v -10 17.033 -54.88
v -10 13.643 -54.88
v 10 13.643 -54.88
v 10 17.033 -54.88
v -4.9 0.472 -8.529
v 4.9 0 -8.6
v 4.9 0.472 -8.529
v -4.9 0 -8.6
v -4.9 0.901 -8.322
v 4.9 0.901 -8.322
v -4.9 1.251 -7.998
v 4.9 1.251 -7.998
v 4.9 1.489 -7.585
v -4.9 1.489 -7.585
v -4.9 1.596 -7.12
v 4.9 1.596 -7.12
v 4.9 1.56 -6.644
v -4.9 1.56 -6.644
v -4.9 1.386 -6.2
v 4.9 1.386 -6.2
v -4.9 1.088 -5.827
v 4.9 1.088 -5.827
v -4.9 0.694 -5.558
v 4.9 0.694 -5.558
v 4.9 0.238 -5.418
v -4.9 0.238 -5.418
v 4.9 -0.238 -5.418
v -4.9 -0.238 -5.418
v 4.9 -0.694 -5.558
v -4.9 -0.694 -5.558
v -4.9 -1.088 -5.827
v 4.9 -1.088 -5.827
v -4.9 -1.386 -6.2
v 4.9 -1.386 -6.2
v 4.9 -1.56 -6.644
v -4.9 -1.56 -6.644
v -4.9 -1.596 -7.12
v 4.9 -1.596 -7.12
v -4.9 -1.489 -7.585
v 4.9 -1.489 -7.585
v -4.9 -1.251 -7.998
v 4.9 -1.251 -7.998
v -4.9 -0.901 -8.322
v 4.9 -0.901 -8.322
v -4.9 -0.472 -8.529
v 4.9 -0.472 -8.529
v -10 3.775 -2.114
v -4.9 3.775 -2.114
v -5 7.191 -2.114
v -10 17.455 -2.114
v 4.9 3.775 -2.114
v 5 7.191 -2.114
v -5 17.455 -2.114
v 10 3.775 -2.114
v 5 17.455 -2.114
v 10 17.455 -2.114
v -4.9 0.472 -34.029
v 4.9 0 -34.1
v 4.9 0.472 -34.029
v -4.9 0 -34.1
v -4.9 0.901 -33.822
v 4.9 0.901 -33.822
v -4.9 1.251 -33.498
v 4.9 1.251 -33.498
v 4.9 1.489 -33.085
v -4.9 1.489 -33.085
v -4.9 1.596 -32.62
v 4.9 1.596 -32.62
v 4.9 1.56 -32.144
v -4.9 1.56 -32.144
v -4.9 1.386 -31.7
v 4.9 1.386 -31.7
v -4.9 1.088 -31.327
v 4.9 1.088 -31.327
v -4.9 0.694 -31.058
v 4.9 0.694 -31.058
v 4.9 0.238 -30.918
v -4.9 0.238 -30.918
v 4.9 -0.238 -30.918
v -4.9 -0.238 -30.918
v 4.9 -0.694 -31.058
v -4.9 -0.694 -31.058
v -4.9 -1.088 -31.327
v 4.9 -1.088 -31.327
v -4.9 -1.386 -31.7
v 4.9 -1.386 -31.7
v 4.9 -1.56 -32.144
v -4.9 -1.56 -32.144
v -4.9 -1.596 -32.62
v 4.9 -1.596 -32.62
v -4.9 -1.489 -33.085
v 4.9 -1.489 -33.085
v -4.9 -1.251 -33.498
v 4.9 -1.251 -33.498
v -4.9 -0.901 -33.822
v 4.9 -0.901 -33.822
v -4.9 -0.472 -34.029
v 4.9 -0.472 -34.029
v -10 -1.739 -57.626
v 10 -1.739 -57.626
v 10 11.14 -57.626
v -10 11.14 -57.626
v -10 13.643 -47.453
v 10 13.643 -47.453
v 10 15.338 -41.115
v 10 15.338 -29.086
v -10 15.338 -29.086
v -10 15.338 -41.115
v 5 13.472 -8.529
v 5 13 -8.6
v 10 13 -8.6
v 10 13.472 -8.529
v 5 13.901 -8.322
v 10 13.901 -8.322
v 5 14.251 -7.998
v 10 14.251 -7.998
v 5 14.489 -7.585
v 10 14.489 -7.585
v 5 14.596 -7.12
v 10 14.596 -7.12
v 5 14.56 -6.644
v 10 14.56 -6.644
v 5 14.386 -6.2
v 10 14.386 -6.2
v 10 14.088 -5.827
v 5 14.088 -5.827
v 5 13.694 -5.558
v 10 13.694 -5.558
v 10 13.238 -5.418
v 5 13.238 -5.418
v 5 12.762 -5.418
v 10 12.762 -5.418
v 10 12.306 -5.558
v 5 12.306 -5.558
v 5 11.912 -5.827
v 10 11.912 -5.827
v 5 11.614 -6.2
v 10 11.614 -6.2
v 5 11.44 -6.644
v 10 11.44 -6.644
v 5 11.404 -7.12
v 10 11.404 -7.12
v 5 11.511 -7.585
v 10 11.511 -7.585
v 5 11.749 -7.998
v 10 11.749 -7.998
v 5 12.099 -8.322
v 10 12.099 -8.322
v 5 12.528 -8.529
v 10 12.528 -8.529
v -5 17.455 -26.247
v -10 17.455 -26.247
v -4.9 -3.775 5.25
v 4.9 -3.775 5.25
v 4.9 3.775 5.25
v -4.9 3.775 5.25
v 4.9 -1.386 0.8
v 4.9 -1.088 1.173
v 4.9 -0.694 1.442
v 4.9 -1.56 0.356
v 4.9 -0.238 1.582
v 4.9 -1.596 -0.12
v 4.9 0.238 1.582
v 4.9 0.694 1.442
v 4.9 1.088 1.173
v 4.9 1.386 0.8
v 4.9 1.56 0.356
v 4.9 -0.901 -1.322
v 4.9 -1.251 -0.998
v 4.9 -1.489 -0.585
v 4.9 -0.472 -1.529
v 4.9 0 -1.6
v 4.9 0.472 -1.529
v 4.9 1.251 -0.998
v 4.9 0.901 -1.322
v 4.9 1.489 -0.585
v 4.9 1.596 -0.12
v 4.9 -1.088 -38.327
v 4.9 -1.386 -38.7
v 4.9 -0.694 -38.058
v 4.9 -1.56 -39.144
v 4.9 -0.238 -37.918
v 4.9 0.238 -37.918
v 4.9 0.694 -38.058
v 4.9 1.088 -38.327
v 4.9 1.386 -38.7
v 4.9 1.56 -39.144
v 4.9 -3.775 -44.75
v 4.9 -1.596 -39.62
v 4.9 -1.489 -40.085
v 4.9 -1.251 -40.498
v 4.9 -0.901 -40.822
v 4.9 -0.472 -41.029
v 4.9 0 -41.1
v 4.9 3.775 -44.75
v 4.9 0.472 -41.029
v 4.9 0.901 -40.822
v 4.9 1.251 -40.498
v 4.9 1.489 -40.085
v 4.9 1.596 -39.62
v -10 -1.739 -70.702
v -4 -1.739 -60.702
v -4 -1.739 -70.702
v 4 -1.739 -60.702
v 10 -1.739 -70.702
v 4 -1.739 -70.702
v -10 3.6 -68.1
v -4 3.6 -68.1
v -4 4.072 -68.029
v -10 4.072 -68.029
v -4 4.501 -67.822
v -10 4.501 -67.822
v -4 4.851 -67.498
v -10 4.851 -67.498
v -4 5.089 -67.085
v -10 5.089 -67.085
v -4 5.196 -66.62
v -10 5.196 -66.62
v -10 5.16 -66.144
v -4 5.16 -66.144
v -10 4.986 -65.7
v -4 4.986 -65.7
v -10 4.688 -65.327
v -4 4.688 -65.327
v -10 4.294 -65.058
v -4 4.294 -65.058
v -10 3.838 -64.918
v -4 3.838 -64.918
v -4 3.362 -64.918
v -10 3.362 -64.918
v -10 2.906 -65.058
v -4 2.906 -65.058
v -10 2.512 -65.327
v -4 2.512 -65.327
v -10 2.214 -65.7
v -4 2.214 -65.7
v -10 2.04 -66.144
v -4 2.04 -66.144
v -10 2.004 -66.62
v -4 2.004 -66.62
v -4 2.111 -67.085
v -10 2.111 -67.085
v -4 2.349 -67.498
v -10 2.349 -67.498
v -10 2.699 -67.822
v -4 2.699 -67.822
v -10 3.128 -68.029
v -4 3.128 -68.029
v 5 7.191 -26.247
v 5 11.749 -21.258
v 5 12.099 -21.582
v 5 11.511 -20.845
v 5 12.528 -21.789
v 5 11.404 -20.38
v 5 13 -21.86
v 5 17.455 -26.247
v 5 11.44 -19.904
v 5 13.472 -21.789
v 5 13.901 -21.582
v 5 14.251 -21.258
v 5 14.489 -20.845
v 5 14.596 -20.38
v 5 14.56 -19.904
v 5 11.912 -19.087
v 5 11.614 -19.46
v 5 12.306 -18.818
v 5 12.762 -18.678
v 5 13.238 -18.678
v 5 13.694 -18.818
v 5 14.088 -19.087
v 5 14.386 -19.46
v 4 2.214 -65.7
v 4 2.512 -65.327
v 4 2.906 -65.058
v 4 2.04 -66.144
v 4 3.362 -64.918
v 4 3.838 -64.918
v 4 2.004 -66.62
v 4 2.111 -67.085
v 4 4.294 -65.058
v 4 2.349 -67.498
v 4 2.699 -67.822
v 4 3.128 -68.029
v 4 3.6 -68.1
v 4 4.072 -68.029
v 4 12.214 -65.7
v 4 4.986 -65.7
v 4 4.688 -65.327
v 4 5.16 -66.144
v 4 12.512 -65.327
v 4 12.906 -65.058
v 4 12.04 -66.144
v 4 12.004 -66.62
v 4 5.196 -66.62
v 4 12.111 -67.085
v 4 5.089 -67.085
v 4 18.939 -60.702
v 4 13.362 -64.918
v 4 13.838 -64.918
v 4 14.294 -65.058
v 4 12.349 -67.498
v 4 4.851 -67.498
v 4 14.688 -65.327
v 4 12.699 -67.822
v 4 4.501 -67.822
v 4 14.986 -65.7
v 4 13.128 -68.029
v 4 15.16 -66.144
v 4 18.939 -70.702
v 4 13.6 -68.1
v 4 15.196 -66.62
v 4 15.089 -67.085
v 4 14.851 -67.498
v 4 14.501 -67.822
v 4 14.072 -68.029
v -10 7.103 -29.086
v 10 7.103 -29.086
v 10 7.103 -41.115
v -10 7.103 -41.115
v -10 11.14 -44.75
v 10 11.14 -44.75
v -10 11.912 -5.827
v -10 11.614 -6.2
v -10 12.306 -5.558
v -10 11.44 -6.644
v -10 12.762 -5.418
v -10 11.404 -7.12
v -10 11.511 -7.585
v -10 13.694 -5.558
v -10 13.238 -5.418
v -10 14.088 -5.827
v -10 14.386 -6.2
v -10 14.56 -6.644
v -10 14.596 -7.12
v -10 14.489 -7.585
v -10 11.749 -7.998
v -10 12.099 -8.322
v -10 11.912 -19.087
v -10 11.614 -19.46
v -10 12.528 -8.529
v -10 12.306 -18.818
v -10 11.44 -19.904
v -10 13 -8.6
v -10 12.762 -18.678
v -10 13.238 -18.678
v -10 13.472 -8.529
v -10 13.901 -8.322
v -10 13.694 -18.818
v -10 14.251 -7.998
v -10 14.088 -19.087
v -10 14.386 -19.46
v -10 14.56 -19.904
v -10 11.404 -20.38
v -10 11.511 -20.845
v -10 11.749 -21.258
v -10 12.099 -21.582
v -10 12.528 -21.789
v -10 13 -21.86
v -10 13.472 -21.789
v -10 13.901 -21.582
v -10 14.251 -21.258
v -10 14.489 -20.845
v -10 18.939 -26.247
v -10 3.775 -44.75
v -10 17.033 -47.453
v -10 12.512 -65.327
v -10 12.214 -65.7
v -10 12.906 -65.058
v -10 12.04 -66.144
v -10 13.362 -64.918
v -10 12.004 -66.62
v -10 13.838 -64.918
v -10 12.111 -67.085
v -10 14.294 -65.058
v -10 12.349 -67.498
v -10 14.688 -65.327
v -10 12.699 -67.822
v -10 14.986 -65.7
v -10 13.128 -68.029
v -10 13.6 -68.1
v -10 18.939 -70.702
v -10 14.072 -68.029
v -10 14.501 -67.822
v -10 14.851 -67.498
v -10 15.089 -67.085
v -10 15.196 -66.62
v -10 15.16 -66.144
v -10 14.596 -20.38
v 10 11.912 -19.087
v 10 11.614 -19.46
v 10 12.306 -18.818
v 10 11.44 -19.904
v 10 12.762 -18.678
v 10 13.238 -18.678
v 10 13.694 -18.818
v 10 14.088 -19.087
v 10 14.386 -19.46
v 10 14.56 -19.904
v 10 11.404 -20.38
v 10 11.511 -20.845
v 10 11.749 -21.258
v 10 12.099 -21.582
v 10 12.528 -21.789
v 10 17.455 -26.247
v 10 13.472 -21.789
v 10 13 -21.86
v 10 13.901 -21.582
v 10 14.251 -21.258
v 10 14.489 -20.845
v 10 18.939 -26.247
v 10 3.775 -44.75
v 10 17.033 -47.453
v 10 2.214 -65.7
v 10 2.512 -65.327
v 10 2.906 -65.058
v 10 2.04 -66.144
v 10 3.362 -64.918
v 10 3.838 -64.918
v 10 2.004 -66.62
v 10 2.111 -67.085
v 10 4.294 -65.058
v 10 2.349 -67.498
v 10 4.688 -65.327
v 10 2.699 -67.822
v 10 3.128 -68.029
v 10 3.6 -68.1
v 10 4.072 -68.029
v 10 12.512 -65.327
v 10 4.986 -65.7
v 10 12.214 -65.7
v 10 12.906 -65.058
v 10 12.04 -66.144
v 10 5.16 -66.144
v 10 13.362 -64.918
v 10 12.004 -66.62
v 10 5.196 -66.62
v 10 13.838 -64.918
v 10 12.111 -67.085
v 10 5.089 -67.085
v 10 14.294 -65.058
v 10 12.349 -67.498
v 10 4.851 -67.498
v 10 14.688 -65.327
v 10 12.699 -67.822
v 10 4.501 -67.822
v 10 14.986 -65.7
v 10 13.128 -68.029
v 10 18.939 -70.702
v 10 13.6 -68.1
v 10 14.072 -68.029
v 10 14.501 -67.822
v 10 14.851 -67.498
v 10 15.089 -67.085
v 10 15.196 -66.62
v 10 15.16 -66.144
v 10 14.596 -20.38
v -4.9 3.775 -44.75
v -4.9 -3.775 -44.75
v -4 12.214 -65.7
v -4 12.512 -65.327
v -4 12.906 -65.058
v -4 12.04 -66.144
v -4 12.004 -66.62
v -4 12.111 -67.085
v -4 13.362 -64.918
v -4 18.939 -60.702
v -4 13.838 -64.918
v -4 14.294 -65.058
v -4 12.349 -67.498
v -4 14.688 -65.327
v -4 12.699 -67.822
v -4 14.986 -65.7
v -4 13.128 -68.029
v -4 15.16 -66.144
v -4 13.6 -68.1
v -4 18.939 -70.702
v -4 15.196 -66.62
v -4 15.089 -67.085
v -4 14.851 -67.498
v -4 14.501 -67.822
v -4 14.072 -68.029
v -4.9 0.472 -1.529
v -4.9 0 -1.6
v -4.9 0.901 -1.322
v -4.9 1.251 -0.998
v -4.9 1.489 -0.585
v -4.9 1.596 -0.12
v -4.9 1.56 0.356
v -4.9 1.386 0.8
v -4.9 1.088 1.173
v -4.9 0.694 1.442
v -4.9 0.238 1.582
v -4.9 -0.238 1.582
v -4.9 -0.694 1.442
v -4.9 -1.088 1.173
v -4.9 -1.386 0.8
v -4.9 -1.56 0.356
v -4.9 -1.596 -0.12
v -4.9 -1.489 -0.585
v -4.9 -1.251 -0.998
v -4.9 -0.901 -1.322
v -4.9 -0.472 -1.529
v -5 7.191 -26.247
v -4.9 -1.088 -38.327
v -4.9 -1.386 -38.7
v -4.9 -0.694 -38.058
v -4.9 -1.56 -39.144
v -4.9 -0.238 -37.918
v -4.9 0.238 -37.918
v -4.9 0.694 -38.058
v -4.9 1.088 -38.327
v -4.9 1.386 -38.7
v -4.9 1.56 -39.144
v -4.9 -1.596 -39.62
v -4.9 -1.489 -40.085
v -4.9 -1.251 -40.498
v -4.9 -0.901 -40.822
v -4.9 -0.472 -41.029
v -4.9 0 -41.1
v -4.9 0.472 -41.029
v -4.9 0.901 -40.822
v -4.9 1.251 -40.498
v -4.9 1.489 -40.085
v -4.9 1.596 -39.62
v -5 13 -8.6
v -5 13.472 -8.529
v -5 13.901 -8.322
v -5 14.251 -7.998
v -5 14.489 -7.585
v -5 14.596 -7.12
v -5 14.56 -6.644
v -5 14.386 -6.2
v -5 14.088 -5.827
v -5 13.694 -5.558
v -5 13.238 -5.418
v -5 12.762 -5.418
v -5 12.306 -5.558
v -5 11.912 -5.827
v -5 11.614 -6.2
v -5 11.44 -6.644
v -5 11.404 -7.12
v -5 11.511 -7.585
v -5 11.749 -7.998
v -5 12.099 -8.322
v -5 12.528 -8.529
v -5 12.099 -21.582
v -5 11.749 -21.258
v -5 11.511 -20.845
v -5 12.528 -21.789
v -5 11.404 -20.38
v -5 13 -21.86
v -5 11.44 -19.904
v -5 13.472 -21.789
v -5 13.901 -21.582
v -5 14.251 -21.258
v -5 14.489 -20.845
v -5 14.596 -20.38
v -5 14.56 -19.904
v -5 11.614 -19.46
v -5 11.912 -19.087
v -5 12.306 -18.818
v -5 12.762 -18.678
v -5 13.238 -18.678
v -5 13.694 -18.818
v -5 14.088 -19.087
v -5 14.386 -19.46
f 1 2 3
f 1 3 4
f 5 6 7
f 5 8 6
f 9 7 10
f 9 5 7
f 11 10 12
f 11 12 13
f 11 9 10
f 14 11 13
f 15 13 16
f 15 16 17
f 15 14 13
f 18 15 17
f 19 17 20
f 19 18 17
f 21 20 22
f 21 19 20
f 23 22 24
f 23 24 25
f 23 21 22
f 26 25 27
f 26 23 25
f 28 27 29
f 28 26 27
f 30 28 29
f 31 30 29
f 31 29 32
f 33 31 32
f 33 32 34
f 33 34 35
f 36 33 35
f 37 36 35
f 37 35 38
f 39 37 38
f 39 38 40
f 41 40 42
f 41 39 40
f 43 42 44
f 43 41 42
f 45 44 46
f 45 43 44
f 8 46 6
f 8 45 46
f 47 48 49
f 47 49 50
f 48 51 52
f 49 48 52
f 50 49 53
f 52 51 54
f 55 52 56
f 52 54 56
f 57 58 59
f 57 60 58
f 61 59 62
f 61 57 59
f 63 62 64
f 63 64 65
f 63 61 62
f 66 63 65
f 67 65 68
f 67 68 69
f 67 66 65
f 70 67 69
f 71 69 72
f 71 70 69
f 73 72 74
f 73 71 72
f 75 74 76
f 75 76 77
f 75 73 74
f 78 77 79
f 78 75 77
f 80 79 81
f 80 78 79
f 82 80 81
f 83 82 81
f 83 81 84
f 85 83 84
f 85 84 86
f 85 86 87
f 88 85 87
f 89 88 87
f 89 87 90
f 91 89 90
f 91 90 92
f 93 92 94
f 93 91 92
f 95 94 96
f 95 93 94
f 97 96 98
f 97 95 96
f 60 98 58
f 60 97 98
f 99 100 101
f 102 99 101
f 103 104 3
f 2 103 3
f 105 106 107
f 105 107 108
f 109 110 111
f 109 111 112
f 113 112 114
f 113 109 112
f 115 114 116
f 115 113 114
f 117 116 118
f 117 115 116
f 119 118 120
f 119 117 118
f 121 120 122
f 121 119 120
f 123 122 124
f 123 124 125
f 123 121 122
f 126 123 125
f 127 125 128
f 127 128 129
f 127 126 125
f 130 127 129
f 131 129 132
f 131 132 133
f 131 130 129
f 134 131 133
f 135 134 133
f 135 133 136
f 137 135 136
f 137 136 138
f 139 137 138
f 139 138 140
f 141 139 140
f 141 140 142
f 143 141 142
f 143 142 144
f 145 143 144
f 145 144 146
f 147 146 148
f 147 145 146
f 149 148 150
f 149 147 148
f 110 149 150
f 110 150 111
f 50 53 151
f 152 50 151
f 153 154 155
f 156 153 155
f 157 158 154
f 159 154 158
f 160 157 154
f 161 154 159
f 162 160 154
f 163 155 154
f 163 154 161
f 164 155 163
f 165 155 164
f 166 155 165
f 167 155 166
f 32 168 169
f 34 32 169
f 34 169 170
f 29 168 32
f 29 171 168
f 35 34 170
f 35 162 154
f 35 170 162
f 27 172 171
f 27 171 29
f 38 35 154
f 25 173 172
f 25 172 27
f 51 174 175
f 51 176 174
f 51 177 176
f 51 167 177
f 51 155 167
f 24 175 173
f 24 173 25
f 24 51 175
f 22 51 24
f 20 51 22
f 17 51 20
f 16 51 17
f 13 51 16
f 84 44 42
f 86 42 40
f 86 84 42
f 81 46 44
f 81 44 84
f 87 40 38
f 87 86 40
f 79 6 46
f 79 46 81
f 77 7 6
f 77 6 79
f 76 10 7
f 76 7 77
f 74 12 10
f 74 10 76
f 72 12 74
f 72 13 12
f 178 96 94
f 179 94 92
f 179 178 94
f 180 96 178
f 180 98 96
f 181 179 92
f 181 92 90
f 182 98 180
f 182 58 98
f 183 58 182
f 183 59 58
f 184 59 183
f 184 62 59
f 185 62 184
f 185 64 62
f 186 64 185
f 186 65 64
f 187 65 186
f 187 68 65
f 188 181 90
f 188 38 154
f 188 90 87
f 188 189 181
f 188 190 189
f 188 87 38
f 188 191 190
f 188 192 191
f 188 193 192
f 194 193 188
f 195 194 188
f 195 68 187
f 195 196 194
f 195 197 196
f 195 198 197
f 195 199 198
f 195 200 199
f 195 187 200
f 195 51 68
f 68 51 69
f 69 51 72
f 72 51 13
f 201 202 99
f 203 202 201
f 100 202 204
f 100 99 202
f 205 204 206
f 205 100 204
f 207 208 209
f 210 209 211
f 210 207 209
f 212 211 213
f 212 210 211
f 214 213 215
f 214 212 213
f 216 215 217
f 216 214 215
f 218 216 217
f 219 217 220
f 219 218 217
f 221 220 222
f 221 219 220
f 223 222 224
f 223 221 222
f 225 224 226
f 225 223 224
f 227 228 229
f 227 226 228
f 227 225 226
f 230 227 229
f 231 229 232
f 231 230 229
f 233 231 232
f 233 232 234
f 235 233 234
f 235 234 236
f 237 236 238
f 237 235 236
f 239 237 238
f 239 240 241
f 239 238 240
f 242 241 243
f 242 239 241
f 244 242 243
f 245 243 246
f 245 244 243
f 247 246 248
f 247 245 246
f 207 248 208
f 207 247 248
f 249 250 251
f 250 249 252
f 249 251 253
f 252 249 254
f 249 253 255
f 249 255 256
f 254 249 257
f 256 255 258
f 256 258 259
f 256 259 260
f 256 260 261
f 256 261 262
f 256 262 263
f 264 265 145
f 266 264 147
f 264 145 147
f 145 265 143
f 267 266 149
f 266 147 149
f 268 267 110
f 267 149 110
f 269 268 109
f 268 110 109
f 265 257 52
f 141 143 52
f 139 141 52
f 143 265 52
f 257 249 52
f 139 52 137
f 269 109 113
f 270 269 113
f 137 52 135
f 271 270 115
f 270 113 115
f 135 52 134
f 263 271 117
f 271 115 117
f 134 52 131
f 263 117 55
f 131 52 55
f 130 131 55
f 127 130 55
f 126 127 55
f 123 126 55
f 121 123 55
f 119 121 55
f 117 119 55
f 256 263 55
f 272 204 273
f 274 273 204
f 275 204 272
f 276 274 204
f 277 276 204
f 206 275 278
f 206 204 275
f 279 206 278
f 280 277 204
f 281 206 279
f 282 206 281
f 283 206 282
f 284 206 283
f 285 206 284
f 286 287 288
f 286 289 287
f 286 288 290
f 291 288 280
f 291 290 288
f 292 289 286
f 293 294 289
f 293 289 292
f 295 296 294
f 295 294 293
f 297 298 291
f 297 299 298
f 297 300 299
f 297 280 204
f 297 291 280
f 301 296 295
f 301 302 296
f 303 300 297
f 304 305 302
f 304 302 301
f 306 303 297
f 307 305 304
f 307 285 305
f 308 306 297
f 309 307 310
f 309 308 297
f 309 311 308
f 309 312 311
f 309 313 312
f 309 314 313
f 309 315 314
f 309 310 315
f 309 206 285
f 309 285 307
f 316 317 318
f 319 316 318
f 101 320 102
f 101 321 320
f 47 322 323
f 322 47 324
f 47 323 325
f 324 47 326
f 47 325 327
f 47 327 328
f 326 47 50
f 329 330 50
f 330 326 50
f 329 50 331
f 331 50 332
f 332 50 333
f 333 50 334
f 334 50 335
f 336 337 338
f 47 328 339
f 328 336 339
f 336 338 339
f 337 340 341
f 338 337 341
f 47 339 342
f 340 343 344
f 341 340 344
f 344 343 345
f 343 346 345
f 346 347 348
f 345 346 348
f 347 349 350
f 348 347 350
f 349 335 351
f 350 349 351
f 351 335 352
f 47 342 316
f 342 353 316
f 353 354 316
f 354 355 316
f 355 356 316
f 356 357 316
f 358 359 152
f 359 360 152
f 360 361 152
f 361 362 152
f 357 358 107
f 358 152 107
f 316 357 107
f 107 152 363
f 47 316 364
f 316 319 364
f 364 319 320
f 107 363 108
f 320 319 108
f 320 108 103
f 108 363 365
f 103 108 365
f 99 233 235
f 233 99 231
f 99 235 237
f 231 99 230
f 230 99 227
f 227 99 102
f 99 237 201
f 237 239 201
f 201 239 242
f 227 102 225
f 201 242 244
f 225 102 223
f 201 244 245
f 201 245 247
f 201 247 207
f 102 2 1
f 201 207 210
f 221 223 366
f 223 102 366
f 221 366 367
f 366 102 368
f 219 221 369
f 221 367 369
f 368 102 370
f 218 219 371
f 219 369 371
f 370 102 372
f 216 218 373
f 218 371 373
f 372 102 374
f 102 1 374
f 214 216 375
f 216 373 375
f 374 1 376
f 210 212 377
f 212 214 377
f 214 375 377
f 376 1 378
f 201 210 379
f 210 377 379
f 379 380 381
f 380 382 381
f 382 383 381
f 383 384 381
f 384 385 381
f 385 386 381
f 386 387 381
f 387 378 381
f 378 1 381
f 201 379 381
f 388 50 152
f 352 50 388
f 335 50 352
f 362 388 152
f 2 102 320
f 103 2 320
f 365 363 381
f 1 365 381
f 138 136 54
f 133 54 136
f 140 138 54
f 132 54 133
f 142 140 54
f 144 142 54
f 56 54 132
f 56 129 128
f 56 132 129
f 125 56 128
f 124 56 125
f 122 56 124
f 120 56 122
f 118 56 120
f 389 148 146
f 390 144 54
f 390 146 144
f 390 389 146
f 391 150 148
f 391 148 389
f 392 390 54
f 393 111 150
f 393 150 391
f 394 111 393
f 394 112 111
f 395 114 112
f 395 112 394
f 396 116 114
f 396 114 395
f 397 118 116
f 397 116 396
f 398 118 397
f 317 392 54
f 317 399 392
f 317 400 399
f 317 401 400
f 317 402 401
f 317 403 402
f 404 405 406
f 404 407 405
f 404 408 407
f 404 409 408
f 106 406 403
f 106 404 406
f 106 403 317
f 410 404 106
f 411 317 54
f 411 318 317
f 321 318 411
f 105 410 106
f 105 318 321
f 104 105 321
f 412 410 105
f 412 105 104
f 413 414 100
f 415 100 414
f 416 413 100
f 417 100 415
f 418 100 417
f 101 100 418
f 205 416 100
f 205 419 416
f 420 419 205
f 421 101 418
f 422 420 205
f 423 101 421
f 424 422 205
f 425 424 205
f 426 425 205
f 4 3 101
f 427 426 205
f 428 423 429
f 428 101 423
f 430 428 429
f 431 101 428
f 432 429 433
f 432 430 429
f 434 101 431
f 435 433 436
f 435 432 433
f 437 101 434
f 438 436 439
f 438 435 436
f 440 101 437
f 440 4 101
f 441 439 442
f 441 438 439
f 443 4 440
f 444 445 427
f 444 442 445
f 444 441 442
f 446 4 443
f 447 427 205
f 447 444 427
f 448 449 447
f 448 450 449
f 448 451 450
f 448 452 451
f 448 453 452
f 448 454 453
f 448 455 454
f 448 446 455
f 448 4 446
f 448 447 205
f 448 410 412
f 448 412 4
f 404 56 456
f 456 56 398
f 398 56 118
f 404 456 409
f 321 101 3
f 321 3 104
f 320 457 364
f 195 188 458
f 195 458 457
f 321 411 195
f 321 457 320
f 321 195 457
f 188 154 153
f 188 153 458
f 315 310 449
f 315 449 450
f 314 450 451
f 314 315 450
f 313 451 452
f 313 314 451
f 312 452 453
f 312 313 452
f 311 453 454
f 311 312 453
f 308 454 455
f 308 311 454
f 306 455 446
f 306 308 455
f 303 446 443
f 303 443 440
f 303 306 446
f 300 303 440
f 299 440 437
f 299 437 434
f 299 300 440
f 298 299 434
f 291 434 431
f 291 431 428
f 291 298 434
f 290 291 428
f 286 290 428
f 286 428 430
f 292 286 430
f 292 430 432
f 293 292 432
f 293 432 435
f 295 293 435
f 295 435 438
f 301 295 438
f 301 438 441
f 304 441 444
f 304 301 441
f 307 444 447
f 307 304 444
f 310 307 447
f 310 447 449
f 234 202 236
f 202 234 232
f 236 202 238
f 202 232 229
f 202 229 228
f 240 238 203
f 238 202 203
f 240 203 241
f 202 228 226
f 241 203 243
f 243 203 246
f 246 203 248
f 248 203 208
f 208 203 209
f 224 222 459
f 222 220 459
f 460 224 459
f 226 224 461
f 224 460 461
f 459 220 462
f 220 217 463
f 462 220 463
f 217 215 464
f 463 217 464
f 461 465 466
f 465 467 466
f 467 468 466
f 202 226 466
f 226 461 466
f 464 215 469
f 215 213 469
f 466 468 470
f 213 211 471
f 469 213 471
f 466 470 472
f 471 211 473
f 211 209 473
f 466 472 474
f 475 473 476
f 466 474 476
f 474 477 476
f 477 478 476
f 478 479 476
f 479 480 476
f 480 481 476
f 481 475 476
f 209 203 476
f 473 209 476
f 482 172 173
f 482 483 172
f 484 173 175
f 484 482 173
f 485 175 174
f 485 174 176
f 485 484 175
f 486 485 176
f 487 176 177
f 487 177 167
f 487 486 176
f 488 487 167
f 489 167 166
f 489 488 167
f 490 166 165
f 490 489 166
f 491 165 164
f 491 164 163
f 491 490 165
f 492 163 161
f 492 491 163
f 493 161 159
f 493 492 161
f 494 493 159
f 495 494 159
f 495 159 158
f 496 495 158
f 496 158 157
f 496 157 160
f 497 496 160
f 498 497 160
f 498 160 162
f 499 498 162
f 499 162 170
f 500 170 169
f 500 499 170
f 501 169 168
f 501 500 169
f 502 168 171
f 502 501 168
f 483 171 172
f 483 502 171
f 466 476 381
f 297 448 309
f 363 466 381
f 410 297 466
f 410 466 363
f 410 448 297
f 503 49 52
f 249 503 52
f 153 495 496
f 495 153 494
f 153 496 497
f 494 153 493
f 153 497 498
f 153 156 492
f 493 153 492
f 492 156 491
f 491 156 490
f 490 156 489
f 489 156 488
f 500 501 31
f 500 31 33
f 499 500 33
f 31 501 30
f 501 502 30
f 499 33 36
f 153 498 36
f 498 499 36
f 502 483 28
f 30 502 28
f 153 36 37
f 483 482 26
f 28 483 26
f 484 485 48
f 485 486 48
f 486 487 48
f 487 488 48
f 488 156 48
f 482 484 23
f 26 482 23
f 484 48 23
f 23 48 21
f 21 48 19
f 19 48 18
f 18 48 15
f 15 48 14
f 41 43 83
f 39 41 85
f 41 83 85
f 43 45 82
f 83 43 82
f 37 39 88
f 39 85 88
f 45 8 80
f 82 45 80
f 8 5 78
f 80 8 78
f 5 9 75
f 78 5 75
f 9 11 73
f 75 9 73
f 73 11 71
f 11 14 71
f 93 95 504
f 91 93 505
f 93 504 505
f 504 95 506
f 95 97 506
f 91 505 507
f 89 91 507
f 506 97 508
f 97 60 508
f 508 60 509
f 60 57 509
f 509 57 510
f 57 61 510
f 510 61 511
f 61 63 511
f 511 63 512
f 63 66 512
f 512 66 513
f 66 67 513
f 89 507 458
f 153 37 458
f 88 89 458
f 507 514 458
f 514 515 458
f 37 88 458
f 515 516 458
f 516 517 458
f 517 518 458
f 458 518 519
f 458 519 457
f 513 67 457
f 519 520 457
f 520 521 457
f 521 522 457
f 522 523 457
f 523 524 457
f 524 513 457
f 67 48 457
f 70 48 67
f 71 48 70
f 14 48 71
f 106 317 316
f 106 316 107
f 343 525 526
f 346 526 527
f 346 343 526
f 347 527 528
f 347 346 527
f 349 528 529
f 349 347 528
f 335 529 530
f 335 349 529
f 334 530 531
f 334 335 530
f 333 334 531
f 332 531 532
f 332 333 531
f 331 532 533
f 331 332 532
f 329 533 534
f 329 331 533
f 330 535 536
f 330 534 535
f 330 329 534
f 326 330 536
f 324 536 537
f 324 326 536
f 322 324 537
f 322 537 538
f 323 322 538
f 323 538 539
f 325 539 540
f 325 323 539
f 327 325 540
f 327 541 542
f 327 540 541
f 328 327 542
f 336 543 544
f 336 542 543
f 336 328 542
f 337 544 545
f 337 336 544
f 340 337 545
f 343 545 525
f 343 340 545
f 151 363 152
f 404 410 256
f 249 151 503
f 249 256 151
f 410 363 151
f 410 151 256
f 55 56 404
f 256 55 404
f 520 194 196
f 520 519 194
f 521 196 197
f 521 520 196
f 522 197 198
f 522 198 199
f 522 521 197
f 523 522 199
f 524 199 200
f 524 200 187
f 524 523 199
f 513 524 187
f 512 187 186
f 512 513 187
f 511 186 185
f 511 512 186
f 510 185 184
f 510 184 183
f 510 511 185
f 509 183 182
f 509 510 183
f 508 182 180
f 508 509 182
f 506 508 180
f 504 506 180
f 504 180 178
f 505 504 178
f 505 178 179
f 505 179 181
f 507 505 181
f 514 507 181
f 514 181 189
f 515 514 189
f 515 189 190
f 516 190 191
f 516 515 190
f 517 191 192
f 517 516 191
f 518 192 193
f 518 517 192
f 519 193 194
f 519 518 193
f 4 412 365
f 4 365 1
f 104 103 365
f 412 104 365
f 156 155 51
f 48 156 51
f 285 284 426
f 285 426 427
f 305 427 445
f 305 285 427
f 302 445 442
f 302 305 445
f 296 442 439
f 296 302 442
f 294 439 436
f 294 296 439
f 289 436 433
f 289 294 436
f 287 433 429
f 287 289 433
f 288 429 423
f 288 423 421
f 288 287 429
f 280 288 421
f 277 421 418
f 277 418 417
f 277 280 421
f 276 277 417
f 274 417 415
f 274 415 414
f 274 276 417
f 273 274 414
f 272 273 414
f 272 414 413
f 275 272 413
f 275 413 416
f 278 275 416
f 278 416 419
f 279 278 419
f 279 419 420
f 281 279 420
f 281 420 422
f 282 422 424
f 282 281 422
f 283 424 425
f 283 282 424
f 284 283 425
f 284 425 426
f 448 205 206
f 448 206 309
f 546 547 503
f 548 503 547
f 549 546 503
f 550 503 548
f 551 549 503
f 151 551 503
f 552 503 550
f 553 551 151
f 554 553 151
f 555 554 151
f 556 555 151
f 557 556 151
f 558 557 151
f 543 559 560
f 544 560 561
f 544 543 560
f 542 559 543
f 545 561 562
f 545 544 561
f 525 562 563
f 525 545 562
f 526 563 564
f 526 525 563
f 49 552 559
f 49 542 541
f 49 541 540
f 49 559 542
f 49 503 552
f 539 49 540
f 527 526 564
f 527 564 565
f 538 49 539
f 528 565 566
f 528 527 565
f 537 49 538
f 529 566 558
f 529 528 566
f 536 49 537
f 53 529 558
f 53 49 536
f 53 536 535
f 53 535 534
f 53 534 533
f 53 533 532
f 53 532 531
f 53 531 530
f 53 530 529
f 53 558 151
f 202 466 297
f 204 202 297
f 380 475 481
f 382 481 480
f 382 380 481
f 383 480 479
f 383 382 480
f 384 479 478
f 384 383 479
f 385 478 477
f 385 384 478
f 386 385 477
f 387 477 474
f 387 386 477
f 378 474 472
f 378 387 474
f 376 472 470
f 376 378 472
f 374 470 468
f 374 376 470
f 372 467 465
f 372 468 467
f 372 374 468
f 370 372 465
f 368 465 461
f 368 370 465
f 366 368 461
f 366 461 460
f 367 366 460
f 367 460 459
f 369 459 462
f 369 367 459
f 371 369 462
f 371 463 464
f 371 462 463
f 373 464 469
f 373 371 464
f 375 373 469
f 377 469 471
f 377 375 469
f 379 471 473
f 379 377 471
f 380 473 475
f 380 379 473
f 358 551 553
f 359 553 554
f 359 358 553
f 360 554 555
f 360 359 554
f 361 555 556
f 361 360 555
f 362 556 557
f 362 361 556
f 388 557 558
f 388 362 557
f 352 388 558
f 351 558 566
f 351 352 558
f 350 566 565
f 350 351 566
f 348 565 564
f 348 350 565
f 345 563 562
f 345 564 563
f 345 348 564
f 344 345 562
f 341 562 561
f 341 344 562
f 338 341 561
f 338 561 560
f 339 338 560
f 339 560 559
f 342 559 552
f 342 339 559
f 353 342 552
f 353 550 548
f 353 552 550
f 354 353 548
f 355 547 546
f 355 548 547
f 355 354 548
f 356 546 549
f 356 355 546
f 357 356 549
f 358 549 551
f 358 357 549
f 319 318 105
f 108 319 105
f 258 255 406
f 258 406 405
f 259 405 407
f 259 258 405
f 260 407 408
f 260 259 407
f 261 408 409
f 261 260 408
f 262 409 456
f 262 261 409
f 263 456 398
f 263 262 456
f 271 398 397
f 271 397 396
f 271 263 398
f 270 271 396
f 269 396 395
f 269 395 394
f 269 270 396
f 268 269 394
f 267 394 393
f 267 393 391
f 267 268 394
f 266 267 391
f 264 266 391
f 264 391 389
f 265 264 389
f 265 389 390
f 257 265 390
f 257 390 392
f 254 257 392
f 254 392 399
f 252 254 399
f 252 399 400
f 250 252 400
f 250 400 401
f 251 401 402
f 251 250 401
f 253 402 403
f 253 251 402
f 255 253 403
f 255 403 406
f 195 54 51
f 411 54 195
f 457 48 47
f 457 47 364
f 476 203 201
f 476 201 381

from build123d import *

# Parameters (mm, degrees)
SKETCH_2_W          = 50
SKETCH_2_H          = 7.55
SKETCH_2_R          = 1.6
EXTRUDE_1_DEPTH     = 4.9
SKETCH_3_W          = 24.132891974
SKETCH_3_H          = 13.680093874
SKETCH_3_R          = 1.6
EXTRUDE_2_DEPTH     = 10
SKETCH_4_W          = 10
SKETCH_4_H          = 10.264550668
CUT_EXTRUDE_1_DEPTH = 48.143107127
SKETCH_6_W          = 13.076103469
SKETCH_6_H          = 20.678046372
SKETCH_6_R          = 1.6
EXTRUDE_4_DEPTH     = 10
SKETCH_7_W          = 8
SKETCH_7_H          = 20.678046372
CUT_EXTRUDE_2_DEPTH = 10
EXTRUDE_5_DEPTH     = 10
SKETCH_9_W          = 12.029023446
SKETCH_9_H          = 8.2346335
SKETCH_9_W_2        = 7.42731649
SKETCH_9_H_2        = 3.390731441
CUT_EXTRUDE_3_DEPTH = 76.878053489


with BuildPart() as part:
    # 草图2 → 凸台-拉伸1 (new, symmetric)
    with BuildSketch(Plane(origin=(0, 0, 0), x_dir=(0, 0, -1), z_dir=(1, 0, 0))):
        with Locations((19.75, 0)):
            Rectangle(SKETCH_2_W, SKETCH_2_H)
        Circle(SKETCH_2_R, mode=Mode.SUBTRACT)
        with Locations((7, 0)):
            Circle(SKETCH_2_R, mode=Mode.SUBTRACT)
        with Locations((32.5, 0)):
            Circle(SKETCH_2_R, mode=Mode.SUBTRACT)
        with Locations((39.5, 0)):
            Circle(SKETCH_2_R, mode=Mode.SUBTRACT)
    extrude(amount=EXTRUDE_1_DEPTH, both=True)

    # 草图3 → 凸台-拉伸2 (add, symmetric)
    with BuildSketch(Plane(origin=(0, 0, 0), x_dir=(0, 0, -1), z_dir=(1, 0, 0))):
        with Locations((14.180871083, 10.615046937)):
            Rectangle(SKETCH_3_W, SKETCH_3_H)
        with Locations((7, 13)):
            Circle(SKETCH_3_R, mode=Mode.SUBTRACT)
        with Locations((20.26, 13)):
            Circle(SKETCH_3_R, mode=Mode.SUBTRACT)
    extrude(amount=EXTRUDE_2_DEPTH, both=True)

    # 草图4 → 切除-拉伸1 (cut, through all)
    with BuildSketch(Plane.XY.offset(-2.114425096)):
        with Locations((0, 12.32281854)):
            Rectangle(SKETCH_4_W, SKETCH_4_H)
    extrude(amount=-CUT_EXTRUDE_1_DEPTH, mode=Mode.SUBTRACT)



with BuildPart() as body_2:
    # 草图6 → 凸台-拉伸4 (new, symmetric)
    with BuildSketch(Plane(origin=(0, 0, 0), x_dir=(0, 0, -1), z_dir=(1, 0, 0))):
        with Locations((64.164086861, 8.6)):
            Rectangle(SKETCH_6_W, SKETCH_6_H)
        with Locations((66.5, 3.6)):
            Circle(SKETCH_6_R, mode=Mode.SUBTRACT)
        with Locations((66.5, 13.6)):
            Circle(SKETCH_6_R, mode=Mode.SUBTRACT)
    extrude(amount=EXTRUDE_4_DEPTH, both=True)

    # 草图7 → 切除-拉伸2 (cut)
    with BuildSketch(Plane.XY.offset(-70.702138596)):
        with Locations((0, 8.6)):
            Rectangle(SKETCH_7_W, SKETCH_7_H)
    extrude(amount=CUT_EXTRUDE_2_DEPTH, mode=Mode.SUBTRACT)


with BuildPart() as part_1:
    add(part.part)

    add(body_2.part)  # 凸台-拉伸5 merges body 2
    # 草图8 → 凸台-拉伸5 (add, symmetric)
    with BuildSketch(Plane(origin=(0, 0, 0), x_dir=(0, 0, -1), z_dir=(1, 0, 0))):
        Polygon((57.626035127, 18.939023186), (26.24731707, 18.939023186), (26.24731707, 11.139938787), (26.24731707, 3.775), (44.75, 3.775), (44.75, 11.139938787), (57.626035127, 11.139938787), align=None)
    extrude(amount=EXTRUDE_5_DEPTH, both=True)

    # 草图9 → 切除-拉伸3 (cut, through all)
    with BuildSketch(Plane(origin=(10, 0, 0), x_dir=(0, 0, -1), z_dir=(1, 0, 0))):
        with Locations((35.100955195, 11.220670488)):
            Rectangle(SKETCH_9_W, SKETCH_9_H)
        with Locations((51.16656369, 15.337987238)):
            Rectangle(SKETCH_9_W_2, SKETCH_9_H_2)
    extrude(amount=-CUT_EXTRUDE_3_DEPTH, mode=Mode.SUBTRACT)


solid = part_1.part
